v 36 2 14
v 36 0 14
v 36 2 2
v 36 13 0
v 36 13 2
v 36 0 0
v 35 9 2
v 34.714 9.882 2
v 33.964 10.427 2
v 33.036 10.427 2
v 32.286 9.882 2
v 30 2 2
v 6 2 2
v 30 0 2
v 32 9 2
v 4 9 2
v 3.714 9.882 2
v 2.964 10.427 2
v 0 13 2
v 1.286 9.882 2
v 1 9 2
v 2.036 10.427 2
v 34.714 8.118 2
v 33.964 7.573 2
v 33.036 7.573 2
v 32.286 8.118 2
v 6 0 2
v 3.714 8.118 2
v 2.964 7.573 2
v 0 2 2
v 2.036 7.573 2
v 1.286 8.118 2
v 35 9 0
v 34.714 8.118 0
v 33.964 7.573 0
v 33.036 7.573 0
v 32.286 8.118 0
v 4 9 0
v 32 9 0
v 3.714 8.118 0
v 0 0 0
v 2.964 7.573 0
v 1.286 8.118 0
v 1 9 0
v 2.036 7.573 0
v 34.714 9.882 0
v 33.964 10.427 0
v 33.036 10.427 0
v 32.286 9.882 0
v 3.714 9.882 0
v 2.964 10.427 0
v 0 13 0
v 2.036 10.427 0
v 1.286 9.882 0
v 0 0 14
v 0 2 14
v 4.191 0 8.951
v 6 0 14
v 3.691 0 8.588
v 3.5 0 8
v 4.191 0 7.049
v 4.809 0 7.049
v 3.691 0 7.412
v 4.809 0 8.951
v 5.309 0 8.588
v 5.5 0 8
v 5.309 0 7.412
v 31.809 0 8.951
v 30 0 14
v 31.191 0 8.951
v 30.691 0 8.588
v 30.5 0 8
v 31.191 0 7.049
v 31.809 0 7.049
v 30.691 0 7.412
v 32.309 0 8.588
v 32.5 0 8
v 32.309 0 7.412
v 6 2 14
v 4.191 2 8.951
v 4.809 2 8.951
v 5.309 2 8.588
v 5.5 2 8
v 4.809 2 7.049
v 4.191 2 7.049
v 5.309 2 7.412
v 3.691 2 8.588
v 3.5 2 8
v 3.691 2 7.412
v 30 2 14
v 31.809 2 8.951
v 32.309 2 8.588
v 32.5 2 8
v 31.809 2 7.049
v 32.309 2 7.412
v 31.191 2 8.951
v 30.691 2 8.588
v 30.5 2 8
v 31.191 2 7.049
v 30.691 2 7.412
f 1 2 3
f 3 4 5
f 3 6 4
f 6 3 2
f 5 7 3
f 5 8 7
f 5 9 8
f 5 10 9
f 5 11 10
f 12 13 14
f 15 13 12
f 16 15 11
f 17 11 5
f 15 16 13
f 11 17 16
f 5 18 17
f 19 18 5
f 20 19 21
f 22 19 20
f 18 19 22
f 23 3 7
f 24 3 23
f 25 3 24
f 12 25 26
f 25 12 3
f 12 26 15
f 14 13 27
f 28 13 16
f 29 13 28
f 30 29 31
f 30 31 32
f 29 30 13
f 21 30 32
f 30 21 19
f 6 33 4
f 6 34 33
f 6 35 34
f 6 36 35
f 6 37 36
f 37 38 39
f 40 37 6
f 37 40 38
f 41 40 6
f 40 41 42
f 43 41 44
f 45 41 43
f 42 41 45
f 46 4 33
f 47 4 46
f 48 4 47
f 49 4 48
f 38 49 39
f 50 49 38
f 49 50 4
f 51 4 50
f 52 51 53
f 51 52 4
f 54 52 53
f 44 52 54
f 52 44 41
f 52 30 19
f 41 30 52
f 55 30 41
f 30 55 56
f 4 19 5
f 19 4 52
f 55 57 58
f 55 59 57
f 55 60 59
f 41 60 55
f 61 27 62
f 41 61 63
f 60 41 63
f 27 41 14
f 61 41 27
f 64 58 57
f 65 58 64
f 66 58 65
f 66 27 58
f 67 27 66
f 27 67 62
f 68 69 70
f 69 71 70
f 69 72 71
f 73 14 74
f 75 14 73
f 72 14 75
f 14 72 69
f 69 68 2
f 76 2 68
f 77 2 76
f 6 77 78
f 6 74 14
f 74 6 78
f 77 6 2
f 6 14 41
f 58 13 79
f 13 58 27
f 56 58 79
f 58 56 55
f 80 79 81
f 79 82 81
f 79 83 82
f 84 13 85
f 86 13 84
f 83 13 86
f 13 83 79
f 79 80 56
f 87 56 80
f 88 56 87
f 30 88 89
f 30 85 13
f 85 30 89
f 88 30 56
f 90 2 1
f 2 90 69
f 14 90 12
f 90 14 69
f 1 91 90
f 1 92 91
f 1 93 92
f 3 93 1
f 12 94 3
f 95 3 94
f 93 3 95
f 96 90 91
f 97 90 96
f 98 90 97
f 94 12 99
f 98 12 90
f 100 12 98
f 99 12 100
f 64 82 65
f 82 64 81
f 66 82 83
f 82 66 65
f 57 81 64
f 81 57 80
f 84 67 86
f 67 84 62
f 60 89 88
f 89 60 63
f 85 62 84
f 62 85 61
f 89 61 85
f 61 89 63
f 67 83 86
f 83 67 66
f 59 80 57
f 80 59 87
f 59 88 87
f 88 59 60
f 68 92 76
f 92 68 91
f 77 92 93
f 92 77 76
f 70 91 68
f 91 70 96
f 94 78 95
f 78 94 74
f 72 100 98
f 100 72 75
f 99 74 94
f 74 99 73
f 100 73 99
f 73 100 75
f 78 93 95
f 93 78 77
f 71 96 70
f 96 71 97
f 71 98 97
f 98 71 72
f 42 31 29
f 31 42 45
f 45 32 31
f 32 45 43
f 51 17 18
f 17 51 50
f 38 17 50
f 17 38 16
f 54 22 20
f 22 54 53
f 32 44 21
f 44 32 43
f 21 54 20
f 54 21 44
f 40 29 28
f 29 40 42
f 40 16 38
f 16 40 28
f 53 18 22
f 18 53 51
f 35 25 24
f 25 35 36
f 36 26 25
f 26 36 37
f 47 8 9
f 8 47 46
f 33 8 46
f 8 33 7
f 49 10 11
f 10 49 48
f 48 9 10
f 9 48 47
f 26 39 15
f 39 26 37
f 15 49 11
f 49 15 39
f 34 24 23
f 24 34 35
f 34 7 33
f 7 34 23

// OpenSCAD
largeur=36;
largeurser=24;
hauteur=12;
epaisseur=2;
profondeur=15;
rayon=1.5;
$fn=10;

rt=1;
lt=32-5;

difference(){
union(){
cube([largeur,profondeur-epaisseur,epaisseur]);
cube([(largeur-largeurser)/2,epaisseur,hauteur+epaisseur]);
translate([largeur-(largeur-largeurser)/2,0,0])cube([(largeur-largeurser)/2,epaisseur,hauteur+epaisseur]);
}

translate([(largeur-lt)/2,epaisseur,epaisseur+hauteur/2])rotate([90,0,0])cylinder(r=1,h=epaisseur);
translate([largeur-(largeur-lt)/2,epaisseur,epaisseur+hauteur/2])rotate([90,0,0])cylinder(r=1,h=epaisseur);


translate([rayon+1,rayon+profondeur/2,0])cylinder(r=1.5,h=epaisseur);
translate([largeur-(rayon+1),rayon+profondeur/2,0])cylinder(r=1.5,h=epaisseur);
}
